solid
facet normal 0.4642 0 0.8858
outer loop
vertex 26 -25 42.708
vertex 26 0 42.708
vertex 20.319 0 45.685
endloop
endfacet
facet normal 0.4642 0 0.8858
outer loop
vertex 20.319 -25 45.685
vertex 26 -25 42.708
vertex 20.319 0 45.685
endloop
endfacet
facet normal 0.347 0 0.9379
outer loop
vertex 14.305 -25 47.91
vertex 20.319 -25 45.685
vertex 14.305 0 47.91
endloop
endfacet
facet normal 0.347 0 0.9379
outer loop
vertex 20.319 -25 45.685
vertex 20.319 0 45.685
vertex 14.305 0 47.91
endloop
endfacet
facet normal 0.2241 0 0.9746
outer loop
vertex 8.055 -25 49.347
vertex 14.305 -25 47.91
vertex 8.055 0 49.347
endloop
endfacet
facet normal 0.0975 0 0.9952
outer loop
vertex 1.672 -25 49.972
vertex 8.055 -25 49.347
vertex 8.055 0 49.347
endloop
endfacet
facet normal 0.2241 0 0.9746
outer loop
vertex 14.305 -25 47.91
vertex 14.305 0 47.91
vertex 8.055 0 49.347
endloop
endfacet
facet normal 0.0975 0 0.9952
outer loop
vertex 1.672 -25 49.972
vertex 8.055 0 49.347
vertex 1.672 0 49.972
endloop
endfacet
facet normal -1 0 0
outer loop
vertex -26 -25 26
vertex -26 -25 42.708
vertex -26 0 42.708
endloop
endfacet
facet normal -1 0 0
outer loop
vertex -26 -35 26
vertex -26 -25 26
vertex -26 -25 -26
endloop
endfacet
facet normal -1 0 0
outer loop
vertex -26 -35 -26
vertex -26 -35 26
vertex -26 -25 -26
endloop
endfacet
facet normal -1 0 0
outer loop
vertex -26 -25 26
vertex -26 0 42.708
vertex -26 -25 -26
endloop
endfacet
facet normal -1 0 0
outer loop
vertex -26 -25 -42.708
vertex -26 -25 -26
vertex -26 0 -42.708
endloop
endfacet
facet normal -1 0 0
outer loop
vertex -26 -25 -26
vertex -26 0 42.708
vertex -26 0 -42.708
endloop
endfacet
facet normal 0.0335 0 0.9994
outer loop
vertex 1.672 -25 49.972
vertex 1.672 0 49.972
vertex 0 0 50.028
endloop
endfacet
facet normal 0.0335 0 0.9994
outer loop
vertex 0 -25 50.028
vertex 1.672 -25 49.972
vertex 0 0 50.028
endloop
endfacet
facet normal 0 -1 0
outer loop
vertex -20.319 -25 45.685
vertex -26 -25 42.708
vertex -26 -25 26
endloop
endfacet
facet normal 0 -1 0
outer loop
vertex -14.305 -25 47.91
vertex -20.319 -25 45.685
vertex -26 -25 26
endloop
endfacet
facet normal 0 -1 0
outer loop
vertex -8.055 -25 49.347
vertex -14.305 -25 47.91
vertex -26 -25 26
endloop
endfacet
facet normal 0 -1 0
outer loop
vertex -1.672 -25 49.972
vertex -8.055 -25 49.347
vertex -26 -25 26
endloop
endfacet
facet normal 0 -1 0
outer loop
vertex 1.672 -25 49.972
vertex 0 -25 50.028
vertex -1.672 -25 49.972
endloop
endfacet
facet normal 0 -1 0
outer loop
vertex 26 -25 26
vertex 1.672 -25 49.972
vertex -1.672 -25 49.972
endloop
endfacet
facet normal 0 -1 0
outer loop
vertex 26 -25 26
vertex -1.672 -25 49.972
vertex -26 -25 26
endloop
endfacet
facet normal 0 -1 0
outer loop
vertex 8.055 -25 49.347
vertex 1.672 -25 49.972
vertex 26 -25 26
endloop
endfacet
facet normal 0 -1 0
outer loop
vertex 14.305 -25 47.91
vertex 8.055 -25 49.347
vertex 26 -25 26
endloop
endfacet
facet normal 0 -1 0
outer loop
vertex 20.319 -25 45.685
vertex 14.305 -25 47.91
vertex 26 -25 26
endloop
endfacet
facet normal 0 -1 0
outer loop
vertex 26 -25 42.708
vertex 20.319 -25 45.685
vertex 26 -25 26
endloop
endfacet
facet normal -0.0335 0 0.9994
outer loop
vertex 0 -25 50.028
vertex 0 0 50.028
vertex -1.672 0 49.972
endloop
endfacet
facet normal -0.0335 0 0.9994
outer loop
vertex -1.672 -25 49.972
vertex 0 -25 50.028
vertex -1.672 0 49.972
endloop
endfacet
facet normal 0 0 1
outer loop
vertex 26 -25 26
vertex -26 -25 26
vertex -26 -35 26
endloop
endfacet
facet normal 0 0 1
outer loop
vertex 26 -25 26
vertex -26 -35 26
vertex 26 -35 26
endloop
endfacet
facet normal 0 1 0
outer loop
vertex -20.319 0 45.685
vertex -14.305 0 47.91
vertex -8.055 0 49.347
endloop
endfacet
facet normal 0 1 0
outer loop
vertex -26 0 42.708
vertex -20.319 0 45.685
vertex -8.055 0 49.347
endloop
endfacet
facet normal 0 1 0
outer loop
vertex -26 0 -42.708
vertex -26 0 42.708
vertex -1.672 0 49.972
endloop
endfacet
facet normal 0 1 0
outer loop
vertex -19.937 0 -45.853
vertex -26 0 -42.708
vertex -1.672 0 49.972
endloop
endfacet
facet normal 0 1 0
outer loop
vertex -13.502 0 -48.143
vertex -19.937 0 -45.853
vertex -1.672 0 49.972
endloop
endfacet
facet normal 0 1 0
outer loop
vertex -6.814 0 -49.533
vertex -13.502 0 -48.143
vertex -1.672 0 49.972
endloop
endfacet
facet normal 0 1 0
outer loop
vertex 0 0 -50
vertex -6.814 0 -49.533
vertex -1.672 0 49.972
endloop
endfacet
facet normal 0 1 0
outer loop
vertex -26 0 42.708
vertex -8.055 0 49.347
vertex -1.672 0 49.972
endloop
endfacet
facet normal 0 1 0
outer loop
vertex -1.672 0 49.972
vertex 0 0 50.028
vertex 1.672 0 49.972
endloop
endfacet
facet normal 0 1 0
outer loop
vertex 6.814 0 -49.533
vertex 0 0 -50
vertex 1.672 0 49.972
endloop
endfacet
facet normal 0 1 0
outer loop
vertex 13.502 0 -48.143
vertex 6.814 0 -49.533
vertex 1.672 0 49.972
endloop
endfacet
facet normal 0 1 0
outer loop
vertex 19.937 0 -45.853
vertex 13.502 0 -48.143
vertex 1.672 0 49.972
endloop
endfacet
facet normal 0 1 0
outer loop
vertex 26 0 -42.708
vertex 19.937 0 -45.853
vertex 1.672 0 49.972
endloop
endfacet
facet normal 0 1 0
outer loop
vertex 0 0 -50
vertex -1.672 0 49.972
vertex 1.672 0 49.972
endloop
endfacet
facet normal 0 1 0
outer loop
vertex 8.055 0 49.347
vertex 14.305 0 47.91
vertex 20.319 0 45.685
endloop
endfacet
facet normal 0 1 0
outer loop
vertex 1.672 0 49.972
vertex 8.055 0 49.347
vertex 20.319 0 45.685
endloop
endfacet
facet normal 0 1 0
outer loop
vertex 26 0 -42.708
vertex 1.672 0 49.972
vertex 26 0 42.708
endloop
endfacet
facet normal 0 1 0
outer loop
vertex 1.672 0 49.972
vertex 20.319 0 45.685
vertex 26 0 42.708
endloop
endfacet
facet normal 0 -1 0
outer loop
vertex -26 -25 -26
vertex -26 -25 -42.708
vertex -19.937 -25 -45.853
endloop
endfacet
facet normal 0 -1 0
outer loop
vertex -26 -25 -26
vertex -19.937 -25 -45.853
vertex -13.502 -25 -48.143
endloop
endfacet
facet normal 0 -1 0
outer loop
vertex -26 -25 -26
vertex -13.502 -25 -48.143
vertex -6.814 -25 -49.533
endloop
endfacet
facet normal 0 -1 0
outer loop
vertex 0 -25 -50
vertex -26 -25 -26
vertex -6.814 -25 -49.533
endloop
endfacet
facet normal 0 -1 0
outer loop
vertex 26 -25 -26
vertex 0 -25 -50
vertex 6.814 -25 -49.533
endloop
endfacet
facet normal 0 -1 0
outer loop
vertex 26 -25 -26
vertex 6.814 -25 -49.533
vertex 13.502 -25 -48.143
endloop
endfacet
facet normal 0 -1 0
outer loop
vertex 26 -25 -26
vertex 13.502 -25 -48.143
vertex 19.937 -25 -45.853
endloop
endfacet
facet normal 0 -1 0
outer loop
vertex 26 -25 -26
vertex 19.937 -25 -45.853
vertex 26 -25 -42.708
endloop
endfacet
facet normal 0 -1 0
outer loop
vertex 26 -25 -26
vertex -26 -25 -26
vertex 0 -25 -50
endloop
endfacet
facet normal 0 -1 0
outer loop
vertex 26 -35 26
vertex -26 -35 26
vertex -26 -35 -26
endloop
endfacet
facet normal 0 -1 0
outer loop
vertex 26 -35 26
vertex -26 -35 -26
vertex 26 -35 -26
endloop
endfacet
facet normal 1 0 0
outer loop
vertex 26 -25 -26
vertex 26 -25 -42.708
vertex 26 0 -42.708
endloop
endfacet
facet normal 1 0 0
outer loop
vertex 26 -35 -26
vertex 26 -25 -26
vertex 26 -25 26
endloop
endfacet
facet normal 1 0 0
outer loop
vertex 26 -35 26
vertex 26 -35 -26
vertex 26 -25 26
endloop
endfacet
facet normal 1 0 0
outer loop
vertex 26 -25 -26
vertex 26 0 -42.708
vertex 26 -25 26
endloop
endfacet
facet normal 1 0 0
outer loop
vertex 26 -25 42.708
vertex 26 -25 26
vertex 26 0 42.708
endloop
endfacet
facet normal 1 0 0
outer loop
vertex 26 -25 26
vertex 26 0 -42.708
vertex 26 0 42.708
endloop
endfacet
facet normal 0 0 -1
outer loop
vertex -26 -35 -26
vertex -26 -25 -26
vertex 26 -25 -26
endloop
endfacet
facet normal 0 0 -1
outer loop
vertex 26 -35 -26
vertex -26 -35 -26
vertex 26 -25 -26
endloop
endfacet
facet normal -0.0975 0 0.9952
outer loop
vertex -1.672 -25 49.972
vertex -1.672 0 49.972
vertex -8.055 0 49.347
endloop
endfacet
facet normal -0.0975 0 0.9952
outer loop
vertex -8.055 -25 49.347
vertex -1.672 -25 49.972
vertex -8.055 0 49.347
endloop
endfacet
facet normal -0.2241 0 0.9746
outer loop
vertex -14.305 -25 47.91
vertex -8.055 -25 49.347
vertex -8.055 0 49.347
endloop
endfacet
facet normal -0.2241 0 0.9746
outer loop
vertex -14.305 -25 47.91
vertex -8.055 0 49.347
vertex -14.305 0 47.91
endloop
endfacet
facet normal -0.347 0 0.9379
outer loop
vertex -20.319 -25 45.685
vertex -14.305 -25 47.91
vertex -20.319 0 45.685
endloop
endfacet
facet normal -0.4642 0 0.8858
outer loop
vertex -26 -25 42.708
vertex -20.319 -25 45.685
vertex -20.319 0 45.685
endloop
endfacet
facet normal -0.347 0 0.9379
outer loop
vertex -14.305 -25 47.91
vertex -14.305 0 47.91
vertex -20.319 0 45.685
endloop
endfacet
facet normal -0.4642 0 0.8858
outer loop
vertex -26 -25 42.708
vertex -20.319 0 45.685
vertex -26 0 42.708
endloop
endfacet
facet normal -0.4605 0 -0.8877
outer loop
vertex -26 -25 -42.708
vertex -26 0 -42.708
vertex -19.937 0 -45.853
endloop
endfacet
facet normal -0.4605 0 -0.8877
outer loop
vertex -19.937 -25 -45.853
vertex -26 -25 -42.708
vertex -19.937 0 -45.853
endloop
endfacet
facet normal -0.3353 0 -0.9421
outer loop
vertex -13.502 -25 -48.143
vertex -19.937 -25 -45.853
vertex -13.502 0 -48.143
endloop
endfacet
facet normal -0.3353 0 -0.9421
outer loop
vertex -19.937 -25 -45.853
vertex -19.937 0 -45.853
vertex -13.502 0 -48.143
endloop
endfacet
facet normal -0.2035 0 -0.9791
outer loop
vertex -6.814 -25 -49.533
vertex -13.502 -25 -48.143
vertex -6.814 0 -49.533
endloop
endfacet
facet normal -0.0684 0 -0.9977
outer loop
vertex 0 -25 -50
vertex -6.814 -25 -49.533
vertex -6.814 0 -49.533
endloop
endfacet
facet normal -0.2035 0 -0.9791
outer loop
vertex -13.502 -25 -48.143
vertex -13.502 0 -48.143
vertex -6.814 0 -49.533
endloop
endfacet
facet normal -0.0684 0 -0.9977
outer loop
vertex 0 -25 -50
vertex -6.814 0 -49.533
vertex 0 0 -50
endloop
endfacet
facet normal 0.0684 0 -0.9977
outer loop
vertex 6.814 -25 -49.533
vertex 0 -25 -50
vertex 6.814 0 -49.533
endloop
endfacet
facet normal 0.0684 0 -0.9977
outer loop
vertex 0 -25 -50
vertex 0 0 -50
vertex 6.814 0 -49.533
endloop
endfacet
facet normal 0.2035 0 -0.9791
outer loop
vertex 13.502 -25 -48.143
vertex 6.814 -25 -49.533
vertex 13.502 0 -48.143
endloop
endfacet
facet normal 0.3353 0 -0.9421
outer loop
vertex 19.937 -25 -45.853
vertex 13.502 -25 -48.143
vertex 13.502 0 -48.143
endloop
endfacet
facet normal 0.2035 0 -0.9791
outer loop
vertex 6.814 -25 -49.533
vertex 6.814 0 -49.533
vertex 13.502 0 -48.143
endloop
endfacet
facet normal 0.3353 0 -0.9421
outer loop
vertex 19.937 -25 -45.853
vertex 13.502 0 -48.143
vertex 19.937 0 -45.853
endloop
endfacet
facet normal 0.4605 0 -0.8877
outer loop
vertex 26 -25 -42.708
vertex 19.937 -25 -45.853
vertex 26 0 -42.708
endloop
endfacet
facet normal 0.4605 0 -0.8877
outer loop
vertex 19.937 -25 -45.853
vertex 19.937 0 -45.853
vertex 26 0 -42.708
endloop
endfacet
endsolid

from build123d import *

# Parameters (mm, degrees)
F0_R      = 12.7
F1_DEPTH  = 10
F1_FACE_W = 52
F1_FACE_H = 52
F2_DEPTH  = 25


with BuildPart() as f1:
    # F0 (on Front) → F1 (new body)
    with BuildSketch(Plane.XZ):
        with BuildLine():
            Line((-26, -26), (0, -26))
            ThreePointArc((0, -26), (-18.384776, -18.384776), (-26, 0))
            Line((-26, 0), (-26, -26))
        make_face()
        with BuildLine():
            Line((26, -26), (26, 0))
            ThreePointArc((26, 0), (18.384776, -18.384776), (0, -26))
            Line((0, -26), (26, -26))
        make_face()
        with BuildLine():
            ThreePointArc((-26, 0), (-18.384776, 18.384776), (0, 26))
            Line((0, 26), (-26, 26))
            Line((-26, 26), (-26, 0))
        make_face()
        with BuildLine():
            ThreePointArc((0, 26), (18.384776, 18.384776), (26, 0))
            Line((26, 0), (26, 26))
            Line((26, 26), (0, 26))
        make_face()
        with BuildLine():
            ThreePointArc((0, -26), (18.384776, -18.384776), (26, 0))
            ThreePointArc((26, 0), (18.384776, 18.384776), (0, 26))
            ThreePointArc((0, 26), (-18.384776, 18.384776), (-26, 0))
            ThreePointArc((-26, 0), (-18.384776, -18.384776), (0, -26))
        make_face()
        Circle(F0_R, mode=Mode.SUBTRACT)
        Circle(F0_R)
    extrude(amount=F1_DEPTH)

    # F0 (on Front) + F1_face (on face) → F2 (join)
    with BuildSketch(Plane.XZ):
        with BuildLine():
            Line((26, -26), (26, 0))
            ThreePointArc((26, 0), (18.384776, -18.384776), (0, -26))
            Line((0, -26), (26, -26))
        make_face()
        with BuildLine():
            ThreePointArc((0, 26), (18.384776, 18.384776), (26, 0))
            Line((26, 0), (26, 26))
            Line((26, 26), (0, 26))
        make_face()
        with BuildLine():
            Line((-26, 26), (0, 26))
            Line((0, 26), (26, 26))
            Line((26, 26), (26, 42.708313))
            ThreePointArc((26, 42.708313), (14.304673, 47.910086), (1.67188, 49.97204))
            Line((1.67188, 49.97204), (0, 50.027975))
            Line((0, 50.027975), (-1.67188, 49.97204))
            ThreePointArc((-1.67188, 49.97204), (-14.304673, 47.910086), (-26, 42.708313))
            Line((-26, 42.708313), (-26, 26))
        make_face()
        with BuildLine():
            ThreePointArc((-26, 0), (-18.384776, 18.384776), (0, 26))
            Line((0, 26), (-26, 26))
            Line((-26, 26), (-26, 0))
        make_face()
        with BuildLine():
            Line((-26, -26), (0, -26))
            ThreePointArc((0, -26), (-18.384776, -18.384776), (-26, 0))
            Line((-26, 0), (-26, -26))
        make_face()
        with BuildLine():
            Line((26, -26), (0, -26))
            Line((0, -26), (-26, -26))
            Line((-26, -26), (-26, -42.708313))
            ThreePointArc((-26, -42.708313), (0, -50), (26, -42.708313))
            Line((26, -42.708313), (26, -26))
        make_face()
    with BuildSketch(Plane.XZ.offset(10)):
        Rectangle(F1_FACE_W, F1_FACE_H)
    extrude(amount=F2_DEPTH)


solid = f1.part
